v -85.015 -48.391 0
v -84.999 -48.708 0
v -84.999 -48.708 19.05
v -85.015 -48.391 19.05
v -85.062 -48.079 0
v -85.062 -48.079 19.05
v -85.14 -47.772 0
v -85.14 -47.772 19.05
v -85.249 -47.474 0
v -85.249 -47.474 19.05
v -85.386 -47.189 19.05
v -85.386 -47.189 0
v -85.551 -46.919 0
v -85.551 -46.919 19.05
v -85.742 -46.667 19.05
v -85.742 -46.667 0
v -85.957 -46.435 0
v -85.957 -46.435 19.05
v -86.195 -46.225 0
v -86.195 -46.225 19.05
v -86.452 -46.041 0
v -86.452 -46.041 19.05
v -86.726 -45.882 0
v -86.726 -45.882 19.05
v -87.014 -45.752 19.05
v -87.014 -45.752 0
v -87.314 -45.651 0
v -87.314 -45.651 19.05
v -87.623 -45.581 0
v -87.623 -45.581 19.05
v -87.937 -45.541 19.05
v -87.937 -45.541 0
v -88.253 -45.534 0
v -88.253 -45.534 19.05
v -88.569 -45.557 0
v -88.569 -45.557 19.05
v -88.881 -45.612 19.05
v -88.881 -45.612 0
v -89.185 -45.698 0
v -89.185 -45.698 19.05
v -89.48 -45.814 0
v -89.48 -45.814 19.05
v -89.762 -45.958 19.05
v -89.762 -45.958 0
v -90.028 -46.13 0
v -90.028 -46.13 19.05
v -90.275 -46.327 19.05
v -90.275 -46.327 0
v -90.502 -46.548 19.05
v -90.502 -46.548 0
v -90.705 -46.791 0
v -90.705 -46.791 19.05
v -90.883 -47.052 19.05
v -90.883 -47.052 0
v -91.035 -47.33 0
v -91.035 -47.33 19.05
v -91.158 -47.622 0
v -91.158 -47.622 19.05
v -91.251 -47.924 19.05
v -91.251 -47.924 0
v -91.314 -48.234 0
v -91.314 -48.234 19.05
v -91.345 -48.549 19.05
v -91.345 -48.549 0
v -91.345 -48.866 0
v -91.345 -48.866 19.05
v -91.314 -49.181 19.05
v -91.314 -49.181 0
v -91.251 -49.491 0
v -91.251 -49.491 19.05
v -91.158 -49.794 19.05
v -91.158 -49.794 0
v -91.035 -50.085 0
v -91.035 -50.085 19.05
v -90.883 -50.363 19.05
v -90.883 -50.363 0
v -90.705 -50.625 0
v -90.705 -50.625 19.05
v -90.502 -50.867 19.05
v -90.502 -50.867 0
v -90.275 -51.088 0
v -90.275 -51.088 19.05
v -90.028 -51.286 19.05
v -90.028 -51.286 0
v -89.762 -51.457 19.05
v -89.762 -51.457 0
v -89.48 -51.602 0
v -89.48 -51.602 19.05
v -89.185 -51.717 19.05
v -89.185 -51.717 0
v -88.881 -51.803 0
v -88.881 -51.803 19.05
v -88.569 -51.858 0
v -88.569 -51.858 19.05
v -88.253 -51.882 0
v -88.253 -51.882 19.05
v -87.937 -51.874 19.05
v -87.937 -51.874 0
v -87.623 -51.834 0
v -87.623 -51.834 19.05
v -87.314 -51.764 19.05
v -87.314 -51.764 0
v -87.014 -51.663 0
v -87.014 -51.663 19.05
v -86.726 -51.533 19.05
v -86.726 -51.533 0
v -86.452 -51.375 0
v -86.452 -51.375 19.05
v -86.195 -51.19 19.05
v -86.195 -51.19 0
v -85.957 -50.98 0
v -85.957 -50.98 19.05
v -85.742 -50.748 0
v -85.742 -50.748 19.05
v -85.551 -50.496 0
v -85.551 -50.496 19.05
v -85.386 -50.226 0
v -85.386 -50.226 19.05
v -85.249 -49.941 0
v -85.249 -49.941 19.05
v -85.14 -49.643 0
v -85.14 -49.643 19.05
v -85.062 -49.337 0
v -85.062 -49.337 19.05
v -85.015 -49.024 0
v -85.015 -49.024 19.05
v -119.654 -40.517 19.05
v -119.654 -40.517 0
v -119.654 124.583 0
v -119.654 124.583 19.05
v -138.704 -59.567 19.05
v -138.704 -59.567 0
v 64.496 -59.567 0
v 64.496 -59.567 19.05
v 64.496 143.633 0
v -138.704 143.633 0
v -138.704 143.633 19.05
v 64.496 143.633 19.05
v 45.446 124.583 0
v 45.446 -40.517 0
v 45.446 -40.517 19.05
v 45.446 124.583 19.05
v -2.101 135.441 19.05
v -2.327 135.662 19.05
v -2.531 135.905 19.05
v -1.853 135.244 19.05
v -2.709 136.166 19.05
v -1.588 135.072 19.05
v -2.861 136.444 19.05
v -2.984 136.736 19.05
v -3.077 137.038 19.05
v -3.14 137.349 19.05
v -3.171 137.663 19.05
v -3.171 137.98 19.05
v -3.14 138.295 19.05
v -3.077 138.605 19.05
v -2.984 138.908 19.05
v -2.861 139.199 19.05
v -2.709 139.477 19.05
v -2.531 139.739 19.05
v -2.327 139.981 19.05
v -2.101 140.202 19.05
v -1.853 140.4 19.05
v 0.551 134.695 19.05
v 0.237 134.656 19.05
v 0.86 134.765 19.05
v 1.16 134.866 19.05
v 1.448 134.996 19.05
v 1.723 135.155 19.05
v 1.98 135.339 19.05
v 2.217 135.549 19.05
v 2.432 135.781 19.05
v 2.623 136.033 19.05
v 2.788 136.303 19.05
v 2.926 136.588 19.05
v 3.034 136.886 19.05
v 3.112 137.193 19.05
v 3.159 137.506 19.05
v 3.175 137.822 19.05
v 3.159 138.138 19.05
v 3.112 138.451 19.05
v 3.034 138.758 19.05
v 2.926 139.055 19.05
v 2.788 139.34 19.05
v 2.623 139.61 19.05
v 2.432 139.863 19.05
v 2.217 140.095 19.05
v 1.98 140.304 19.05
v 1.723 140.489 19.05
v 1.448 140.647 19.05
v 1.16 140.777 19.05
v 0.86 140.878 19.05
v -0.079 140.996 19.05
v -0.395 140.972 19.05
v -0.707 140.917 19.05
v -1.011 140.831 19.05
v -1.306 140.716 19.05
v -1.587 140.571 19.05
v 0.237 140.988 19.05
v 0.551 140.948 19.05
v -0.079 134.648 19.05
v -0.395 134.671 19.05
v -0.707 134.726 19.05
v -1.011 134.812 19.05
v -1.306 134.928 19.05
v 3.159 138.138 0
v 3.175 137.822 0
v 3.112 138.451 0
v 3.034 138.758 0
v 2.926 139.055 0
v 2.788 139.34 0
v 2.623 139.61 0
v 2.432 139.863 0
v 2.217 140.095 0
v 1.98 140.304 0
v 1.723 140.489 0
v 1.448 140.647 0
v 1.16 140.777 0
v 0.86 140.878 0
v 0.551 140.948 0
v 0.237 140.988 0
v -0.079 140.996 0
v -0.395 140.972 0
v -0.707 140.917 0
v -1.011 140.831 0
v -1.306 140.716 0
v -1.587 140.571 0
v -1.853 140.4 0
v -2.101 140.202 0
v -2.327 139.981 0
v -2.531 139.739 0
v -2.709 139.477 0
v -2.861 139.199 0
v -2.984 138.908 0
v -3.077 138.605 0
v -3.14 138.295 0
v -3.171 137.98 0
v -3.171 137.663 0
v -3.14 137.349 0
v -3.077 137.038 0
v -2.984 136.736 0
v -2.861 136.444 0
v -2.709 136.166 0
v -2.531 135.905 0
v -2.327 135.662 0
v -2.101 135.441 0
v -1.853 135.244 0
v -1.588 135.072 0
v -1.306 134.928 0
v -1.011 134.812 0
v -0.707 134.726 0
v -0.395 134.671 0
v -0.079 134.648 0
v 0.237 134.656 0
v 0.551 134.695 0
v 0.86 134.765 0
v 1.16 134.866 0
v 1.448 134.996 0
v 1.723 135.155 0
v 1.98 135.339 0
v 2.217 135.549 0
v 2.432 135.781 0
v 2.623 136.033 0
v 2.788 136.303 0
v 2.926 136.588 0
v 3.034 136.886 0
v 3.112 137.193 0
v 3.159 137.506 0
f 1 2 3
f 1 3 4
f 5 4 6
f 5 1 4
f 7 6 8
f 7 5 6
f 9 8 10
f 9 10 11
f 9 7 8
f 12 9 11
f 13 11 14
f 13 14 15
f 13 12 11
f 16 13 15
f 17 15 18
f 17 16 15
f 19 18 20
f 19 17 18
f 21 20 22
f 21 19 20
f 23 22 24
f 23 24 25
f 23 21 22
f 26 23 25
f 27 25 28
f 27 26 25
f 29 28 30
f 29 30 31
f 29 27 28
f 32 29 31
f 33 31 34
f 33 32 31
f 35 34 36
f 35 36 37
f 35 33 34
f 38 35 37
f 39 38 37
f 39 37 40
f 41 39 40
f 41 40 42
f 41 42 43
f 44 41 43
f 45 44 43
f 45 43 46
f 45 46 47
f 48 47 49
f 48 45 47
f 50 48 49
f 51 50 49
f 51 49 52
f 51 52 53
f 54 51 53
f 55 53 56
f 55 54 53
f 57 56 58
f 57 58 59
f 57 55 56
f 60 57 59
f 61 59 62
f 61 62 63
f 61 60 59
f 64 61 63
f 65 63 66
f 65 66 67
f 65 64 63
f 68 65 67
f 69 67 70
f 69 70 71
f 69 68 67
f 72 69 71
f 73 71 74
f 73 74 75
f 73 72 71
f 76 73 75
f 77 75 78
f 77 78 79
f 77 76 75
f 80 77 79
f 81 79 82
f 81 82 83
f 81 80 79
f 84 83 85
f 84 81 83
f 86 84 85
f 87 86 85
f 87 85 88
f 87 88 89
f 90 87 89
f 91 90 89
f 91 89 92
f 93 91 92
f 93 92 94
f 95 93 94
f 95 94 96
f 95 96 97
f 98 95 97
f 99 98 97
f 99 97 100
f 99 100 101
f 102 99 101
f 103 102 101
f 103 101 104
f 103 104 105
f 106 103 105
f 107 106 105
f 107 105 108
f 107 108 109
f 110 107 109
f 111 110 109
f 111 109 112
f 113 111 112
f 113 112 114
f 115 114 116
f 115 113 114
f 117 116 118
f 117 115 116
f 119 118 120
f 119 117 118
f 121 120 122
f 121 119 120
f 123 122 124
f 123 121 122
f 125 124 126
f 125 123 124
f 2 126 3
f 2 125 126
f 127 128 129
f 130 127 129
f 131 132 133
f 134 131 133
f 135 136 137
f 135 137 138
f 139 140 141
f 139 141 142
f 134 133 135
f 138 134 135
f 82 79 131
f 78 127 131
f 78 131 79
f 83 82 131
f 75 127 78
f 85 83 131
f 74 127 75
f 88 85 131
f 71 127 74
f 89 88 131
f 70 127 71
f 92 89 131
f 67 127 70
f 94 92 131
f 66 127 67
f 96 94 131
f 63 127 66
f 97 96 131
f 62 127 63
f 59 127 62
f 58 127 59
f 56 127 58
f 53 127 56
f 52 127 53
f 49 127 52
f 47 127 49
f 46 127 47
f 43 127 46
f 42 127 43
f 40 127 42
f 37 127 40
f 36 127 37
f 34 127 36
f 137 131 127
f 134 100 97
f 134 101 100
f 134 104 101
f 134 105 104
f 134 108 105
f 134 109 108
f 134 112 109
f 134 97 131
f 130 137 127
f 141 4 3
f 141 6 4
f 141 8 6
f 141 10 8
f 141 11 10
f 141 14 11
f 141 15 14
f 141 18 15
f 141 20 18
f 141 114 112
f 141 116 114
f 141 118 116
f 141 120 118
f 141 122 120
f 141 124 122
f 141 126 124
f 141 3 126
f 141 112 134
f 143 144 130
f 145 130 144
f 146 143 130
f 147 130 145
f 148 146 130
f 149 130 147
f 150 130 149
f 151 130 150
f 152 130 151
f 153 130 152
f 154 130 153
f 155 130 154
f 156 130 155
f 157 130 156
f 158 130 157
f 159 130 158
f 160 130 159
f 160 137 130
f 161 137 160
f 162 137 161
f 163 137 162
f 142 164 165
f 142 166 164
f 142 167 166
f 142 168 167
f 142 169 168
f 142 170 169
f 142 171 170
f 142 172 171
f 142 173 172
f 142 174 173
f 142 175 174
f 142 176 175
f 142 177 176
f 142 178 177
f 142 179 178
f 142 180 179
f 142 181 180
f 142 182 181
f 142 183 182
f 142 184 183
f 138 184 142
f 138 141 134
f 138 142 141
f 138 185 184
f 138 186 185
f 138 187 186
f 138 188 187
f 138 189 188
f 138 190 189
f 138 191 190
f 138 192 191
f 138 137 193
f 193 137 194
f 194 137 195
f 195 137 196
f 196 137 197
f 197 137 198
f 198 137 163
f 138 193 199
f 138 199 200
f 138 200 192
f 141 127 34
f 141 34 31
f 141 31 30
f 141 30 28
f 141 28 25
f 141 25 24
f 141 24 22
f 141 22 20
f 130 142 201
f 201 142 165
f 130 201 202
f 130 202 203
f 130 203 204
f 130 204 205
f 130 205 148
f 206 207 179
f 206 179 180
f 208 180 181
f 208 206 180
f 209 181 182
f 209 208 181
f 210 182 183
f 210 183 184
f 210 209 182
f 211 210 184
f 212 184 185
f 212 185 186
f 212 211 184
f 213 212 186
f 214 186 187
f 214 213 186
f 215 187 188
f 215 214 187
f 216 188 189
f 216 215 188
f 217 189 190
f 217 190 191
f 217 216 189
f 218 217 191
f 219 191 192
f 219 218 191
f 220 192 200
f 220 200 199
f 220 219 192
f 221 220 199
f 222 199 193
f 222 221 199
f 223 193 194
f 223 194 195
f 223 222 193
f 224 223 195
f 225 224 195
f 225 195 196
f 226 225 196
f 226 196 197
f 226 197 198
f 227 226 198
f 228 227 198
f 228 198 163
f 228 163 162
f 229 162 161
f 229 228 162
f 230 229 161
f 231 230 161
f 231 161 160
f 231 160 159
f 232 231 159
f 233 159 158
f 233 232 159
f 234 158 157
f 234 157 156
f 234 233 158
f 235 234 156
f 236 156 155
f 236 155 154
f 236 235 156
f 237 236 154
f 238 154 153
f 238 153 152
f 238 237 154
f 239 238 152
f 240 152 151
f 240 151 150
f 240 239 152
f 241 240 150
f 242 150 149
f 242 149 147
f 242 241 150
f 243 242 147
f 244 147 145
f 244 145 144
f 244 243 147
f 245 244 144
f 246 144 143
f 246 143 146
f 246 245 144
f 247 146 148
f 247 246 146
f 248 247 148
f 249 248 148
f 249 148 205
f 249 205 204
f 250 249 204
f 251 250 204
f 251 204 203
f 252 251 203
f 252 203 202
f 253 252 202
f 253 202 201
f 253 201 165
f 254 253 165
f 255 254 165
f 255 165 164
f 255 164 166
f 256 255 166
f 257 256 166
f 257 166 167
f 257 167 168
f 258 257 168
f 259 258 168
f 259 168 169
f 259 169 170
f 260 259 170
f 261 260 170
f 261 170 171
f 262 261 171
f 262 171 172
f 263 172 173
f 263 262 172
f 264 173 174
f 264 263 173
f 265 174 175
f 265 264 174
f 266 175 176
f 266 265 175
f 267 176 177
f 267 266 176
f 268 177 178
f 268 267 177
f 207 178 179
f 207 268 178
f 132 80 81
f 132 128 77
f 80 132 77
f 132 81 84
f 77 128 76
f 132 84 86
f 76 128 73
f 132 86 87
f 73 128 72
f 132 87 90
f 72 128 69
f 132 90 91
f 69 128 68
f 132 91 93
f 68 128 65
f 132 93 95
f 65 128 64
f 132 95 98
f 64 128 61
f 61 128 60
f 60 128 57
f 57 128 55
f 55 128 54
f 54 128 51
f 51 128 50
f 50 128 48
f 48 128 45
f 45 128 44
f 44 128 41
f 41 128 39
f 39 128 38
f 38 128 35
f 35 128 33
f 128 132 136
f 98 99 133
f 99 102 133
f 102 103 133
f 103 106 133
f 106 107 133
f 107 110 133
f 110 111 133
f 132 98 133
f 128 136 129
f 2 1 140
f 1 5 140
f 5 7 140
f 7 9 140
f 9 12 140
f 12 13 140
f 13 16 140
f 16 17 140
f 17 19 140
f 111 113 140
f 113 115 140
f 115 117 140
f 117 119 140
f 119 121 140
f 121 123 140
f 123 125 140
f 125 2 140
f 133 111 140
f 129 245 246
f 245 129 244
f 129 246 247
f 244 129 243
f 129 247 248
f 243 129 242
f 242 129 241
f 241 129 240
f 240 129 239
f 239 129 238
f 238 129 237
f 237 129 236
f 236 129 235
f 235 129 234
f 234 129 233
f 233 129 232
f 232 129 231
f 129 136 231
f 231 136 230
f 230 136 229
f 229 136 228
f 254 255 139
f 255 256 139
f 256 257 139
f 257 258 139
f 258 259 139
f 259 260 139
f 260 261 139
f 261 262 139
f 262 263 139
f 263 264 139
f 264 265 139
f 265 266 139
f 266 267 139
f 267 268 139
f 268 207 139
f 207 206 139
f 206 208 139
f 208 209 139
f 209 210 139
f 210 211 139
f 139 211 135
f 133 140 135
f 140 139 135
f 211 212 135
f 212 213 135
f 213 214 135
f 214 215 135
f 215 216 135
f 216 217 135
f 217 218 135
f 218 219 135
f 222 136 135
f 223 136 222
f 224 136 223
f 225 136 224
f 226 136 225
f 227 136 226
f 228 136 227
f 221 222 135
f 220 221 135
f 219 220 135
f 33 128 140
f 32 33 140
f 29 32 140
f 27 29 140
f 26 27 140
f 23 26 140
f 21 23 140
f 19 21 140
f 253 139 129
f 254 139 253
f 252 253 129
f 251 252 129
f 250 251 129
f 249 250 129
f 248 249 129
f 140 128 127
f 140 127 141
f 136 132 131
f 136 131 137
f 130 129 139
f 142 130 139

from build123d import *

# Parameters (mm, degrees)
F0_W     = 203.2
F0_H     = 203.2
F0_R     = 3.175
F0_W_2   = 165.100006
F0_H_2   = 165.100005
F1_DEPTH = 19.05


with BuildPart() as f1:
    # F0 (on Top) → F1 (new body)
    with BuildSketch(Plane.XY):
        with Locations((-37.103736, 42.032712)):
            Rectangle(F0_W, F0_H)
        with Locations((-88.174261, -48.707619)):
            Circle(F0_R, mode=Mode.SUBTRACT)
        with Locations((-37.103736, 42.032713)):
            Rectangle(F0_W_2, F0_H_2, mode=Mode.SUBTRACT)
        with Locations((0, 137.821719)):
            Circle(F0_R, mode=Mode.SUBTRACT)
    extrude(amount=F1_DEPTH)


solid = f1.part
